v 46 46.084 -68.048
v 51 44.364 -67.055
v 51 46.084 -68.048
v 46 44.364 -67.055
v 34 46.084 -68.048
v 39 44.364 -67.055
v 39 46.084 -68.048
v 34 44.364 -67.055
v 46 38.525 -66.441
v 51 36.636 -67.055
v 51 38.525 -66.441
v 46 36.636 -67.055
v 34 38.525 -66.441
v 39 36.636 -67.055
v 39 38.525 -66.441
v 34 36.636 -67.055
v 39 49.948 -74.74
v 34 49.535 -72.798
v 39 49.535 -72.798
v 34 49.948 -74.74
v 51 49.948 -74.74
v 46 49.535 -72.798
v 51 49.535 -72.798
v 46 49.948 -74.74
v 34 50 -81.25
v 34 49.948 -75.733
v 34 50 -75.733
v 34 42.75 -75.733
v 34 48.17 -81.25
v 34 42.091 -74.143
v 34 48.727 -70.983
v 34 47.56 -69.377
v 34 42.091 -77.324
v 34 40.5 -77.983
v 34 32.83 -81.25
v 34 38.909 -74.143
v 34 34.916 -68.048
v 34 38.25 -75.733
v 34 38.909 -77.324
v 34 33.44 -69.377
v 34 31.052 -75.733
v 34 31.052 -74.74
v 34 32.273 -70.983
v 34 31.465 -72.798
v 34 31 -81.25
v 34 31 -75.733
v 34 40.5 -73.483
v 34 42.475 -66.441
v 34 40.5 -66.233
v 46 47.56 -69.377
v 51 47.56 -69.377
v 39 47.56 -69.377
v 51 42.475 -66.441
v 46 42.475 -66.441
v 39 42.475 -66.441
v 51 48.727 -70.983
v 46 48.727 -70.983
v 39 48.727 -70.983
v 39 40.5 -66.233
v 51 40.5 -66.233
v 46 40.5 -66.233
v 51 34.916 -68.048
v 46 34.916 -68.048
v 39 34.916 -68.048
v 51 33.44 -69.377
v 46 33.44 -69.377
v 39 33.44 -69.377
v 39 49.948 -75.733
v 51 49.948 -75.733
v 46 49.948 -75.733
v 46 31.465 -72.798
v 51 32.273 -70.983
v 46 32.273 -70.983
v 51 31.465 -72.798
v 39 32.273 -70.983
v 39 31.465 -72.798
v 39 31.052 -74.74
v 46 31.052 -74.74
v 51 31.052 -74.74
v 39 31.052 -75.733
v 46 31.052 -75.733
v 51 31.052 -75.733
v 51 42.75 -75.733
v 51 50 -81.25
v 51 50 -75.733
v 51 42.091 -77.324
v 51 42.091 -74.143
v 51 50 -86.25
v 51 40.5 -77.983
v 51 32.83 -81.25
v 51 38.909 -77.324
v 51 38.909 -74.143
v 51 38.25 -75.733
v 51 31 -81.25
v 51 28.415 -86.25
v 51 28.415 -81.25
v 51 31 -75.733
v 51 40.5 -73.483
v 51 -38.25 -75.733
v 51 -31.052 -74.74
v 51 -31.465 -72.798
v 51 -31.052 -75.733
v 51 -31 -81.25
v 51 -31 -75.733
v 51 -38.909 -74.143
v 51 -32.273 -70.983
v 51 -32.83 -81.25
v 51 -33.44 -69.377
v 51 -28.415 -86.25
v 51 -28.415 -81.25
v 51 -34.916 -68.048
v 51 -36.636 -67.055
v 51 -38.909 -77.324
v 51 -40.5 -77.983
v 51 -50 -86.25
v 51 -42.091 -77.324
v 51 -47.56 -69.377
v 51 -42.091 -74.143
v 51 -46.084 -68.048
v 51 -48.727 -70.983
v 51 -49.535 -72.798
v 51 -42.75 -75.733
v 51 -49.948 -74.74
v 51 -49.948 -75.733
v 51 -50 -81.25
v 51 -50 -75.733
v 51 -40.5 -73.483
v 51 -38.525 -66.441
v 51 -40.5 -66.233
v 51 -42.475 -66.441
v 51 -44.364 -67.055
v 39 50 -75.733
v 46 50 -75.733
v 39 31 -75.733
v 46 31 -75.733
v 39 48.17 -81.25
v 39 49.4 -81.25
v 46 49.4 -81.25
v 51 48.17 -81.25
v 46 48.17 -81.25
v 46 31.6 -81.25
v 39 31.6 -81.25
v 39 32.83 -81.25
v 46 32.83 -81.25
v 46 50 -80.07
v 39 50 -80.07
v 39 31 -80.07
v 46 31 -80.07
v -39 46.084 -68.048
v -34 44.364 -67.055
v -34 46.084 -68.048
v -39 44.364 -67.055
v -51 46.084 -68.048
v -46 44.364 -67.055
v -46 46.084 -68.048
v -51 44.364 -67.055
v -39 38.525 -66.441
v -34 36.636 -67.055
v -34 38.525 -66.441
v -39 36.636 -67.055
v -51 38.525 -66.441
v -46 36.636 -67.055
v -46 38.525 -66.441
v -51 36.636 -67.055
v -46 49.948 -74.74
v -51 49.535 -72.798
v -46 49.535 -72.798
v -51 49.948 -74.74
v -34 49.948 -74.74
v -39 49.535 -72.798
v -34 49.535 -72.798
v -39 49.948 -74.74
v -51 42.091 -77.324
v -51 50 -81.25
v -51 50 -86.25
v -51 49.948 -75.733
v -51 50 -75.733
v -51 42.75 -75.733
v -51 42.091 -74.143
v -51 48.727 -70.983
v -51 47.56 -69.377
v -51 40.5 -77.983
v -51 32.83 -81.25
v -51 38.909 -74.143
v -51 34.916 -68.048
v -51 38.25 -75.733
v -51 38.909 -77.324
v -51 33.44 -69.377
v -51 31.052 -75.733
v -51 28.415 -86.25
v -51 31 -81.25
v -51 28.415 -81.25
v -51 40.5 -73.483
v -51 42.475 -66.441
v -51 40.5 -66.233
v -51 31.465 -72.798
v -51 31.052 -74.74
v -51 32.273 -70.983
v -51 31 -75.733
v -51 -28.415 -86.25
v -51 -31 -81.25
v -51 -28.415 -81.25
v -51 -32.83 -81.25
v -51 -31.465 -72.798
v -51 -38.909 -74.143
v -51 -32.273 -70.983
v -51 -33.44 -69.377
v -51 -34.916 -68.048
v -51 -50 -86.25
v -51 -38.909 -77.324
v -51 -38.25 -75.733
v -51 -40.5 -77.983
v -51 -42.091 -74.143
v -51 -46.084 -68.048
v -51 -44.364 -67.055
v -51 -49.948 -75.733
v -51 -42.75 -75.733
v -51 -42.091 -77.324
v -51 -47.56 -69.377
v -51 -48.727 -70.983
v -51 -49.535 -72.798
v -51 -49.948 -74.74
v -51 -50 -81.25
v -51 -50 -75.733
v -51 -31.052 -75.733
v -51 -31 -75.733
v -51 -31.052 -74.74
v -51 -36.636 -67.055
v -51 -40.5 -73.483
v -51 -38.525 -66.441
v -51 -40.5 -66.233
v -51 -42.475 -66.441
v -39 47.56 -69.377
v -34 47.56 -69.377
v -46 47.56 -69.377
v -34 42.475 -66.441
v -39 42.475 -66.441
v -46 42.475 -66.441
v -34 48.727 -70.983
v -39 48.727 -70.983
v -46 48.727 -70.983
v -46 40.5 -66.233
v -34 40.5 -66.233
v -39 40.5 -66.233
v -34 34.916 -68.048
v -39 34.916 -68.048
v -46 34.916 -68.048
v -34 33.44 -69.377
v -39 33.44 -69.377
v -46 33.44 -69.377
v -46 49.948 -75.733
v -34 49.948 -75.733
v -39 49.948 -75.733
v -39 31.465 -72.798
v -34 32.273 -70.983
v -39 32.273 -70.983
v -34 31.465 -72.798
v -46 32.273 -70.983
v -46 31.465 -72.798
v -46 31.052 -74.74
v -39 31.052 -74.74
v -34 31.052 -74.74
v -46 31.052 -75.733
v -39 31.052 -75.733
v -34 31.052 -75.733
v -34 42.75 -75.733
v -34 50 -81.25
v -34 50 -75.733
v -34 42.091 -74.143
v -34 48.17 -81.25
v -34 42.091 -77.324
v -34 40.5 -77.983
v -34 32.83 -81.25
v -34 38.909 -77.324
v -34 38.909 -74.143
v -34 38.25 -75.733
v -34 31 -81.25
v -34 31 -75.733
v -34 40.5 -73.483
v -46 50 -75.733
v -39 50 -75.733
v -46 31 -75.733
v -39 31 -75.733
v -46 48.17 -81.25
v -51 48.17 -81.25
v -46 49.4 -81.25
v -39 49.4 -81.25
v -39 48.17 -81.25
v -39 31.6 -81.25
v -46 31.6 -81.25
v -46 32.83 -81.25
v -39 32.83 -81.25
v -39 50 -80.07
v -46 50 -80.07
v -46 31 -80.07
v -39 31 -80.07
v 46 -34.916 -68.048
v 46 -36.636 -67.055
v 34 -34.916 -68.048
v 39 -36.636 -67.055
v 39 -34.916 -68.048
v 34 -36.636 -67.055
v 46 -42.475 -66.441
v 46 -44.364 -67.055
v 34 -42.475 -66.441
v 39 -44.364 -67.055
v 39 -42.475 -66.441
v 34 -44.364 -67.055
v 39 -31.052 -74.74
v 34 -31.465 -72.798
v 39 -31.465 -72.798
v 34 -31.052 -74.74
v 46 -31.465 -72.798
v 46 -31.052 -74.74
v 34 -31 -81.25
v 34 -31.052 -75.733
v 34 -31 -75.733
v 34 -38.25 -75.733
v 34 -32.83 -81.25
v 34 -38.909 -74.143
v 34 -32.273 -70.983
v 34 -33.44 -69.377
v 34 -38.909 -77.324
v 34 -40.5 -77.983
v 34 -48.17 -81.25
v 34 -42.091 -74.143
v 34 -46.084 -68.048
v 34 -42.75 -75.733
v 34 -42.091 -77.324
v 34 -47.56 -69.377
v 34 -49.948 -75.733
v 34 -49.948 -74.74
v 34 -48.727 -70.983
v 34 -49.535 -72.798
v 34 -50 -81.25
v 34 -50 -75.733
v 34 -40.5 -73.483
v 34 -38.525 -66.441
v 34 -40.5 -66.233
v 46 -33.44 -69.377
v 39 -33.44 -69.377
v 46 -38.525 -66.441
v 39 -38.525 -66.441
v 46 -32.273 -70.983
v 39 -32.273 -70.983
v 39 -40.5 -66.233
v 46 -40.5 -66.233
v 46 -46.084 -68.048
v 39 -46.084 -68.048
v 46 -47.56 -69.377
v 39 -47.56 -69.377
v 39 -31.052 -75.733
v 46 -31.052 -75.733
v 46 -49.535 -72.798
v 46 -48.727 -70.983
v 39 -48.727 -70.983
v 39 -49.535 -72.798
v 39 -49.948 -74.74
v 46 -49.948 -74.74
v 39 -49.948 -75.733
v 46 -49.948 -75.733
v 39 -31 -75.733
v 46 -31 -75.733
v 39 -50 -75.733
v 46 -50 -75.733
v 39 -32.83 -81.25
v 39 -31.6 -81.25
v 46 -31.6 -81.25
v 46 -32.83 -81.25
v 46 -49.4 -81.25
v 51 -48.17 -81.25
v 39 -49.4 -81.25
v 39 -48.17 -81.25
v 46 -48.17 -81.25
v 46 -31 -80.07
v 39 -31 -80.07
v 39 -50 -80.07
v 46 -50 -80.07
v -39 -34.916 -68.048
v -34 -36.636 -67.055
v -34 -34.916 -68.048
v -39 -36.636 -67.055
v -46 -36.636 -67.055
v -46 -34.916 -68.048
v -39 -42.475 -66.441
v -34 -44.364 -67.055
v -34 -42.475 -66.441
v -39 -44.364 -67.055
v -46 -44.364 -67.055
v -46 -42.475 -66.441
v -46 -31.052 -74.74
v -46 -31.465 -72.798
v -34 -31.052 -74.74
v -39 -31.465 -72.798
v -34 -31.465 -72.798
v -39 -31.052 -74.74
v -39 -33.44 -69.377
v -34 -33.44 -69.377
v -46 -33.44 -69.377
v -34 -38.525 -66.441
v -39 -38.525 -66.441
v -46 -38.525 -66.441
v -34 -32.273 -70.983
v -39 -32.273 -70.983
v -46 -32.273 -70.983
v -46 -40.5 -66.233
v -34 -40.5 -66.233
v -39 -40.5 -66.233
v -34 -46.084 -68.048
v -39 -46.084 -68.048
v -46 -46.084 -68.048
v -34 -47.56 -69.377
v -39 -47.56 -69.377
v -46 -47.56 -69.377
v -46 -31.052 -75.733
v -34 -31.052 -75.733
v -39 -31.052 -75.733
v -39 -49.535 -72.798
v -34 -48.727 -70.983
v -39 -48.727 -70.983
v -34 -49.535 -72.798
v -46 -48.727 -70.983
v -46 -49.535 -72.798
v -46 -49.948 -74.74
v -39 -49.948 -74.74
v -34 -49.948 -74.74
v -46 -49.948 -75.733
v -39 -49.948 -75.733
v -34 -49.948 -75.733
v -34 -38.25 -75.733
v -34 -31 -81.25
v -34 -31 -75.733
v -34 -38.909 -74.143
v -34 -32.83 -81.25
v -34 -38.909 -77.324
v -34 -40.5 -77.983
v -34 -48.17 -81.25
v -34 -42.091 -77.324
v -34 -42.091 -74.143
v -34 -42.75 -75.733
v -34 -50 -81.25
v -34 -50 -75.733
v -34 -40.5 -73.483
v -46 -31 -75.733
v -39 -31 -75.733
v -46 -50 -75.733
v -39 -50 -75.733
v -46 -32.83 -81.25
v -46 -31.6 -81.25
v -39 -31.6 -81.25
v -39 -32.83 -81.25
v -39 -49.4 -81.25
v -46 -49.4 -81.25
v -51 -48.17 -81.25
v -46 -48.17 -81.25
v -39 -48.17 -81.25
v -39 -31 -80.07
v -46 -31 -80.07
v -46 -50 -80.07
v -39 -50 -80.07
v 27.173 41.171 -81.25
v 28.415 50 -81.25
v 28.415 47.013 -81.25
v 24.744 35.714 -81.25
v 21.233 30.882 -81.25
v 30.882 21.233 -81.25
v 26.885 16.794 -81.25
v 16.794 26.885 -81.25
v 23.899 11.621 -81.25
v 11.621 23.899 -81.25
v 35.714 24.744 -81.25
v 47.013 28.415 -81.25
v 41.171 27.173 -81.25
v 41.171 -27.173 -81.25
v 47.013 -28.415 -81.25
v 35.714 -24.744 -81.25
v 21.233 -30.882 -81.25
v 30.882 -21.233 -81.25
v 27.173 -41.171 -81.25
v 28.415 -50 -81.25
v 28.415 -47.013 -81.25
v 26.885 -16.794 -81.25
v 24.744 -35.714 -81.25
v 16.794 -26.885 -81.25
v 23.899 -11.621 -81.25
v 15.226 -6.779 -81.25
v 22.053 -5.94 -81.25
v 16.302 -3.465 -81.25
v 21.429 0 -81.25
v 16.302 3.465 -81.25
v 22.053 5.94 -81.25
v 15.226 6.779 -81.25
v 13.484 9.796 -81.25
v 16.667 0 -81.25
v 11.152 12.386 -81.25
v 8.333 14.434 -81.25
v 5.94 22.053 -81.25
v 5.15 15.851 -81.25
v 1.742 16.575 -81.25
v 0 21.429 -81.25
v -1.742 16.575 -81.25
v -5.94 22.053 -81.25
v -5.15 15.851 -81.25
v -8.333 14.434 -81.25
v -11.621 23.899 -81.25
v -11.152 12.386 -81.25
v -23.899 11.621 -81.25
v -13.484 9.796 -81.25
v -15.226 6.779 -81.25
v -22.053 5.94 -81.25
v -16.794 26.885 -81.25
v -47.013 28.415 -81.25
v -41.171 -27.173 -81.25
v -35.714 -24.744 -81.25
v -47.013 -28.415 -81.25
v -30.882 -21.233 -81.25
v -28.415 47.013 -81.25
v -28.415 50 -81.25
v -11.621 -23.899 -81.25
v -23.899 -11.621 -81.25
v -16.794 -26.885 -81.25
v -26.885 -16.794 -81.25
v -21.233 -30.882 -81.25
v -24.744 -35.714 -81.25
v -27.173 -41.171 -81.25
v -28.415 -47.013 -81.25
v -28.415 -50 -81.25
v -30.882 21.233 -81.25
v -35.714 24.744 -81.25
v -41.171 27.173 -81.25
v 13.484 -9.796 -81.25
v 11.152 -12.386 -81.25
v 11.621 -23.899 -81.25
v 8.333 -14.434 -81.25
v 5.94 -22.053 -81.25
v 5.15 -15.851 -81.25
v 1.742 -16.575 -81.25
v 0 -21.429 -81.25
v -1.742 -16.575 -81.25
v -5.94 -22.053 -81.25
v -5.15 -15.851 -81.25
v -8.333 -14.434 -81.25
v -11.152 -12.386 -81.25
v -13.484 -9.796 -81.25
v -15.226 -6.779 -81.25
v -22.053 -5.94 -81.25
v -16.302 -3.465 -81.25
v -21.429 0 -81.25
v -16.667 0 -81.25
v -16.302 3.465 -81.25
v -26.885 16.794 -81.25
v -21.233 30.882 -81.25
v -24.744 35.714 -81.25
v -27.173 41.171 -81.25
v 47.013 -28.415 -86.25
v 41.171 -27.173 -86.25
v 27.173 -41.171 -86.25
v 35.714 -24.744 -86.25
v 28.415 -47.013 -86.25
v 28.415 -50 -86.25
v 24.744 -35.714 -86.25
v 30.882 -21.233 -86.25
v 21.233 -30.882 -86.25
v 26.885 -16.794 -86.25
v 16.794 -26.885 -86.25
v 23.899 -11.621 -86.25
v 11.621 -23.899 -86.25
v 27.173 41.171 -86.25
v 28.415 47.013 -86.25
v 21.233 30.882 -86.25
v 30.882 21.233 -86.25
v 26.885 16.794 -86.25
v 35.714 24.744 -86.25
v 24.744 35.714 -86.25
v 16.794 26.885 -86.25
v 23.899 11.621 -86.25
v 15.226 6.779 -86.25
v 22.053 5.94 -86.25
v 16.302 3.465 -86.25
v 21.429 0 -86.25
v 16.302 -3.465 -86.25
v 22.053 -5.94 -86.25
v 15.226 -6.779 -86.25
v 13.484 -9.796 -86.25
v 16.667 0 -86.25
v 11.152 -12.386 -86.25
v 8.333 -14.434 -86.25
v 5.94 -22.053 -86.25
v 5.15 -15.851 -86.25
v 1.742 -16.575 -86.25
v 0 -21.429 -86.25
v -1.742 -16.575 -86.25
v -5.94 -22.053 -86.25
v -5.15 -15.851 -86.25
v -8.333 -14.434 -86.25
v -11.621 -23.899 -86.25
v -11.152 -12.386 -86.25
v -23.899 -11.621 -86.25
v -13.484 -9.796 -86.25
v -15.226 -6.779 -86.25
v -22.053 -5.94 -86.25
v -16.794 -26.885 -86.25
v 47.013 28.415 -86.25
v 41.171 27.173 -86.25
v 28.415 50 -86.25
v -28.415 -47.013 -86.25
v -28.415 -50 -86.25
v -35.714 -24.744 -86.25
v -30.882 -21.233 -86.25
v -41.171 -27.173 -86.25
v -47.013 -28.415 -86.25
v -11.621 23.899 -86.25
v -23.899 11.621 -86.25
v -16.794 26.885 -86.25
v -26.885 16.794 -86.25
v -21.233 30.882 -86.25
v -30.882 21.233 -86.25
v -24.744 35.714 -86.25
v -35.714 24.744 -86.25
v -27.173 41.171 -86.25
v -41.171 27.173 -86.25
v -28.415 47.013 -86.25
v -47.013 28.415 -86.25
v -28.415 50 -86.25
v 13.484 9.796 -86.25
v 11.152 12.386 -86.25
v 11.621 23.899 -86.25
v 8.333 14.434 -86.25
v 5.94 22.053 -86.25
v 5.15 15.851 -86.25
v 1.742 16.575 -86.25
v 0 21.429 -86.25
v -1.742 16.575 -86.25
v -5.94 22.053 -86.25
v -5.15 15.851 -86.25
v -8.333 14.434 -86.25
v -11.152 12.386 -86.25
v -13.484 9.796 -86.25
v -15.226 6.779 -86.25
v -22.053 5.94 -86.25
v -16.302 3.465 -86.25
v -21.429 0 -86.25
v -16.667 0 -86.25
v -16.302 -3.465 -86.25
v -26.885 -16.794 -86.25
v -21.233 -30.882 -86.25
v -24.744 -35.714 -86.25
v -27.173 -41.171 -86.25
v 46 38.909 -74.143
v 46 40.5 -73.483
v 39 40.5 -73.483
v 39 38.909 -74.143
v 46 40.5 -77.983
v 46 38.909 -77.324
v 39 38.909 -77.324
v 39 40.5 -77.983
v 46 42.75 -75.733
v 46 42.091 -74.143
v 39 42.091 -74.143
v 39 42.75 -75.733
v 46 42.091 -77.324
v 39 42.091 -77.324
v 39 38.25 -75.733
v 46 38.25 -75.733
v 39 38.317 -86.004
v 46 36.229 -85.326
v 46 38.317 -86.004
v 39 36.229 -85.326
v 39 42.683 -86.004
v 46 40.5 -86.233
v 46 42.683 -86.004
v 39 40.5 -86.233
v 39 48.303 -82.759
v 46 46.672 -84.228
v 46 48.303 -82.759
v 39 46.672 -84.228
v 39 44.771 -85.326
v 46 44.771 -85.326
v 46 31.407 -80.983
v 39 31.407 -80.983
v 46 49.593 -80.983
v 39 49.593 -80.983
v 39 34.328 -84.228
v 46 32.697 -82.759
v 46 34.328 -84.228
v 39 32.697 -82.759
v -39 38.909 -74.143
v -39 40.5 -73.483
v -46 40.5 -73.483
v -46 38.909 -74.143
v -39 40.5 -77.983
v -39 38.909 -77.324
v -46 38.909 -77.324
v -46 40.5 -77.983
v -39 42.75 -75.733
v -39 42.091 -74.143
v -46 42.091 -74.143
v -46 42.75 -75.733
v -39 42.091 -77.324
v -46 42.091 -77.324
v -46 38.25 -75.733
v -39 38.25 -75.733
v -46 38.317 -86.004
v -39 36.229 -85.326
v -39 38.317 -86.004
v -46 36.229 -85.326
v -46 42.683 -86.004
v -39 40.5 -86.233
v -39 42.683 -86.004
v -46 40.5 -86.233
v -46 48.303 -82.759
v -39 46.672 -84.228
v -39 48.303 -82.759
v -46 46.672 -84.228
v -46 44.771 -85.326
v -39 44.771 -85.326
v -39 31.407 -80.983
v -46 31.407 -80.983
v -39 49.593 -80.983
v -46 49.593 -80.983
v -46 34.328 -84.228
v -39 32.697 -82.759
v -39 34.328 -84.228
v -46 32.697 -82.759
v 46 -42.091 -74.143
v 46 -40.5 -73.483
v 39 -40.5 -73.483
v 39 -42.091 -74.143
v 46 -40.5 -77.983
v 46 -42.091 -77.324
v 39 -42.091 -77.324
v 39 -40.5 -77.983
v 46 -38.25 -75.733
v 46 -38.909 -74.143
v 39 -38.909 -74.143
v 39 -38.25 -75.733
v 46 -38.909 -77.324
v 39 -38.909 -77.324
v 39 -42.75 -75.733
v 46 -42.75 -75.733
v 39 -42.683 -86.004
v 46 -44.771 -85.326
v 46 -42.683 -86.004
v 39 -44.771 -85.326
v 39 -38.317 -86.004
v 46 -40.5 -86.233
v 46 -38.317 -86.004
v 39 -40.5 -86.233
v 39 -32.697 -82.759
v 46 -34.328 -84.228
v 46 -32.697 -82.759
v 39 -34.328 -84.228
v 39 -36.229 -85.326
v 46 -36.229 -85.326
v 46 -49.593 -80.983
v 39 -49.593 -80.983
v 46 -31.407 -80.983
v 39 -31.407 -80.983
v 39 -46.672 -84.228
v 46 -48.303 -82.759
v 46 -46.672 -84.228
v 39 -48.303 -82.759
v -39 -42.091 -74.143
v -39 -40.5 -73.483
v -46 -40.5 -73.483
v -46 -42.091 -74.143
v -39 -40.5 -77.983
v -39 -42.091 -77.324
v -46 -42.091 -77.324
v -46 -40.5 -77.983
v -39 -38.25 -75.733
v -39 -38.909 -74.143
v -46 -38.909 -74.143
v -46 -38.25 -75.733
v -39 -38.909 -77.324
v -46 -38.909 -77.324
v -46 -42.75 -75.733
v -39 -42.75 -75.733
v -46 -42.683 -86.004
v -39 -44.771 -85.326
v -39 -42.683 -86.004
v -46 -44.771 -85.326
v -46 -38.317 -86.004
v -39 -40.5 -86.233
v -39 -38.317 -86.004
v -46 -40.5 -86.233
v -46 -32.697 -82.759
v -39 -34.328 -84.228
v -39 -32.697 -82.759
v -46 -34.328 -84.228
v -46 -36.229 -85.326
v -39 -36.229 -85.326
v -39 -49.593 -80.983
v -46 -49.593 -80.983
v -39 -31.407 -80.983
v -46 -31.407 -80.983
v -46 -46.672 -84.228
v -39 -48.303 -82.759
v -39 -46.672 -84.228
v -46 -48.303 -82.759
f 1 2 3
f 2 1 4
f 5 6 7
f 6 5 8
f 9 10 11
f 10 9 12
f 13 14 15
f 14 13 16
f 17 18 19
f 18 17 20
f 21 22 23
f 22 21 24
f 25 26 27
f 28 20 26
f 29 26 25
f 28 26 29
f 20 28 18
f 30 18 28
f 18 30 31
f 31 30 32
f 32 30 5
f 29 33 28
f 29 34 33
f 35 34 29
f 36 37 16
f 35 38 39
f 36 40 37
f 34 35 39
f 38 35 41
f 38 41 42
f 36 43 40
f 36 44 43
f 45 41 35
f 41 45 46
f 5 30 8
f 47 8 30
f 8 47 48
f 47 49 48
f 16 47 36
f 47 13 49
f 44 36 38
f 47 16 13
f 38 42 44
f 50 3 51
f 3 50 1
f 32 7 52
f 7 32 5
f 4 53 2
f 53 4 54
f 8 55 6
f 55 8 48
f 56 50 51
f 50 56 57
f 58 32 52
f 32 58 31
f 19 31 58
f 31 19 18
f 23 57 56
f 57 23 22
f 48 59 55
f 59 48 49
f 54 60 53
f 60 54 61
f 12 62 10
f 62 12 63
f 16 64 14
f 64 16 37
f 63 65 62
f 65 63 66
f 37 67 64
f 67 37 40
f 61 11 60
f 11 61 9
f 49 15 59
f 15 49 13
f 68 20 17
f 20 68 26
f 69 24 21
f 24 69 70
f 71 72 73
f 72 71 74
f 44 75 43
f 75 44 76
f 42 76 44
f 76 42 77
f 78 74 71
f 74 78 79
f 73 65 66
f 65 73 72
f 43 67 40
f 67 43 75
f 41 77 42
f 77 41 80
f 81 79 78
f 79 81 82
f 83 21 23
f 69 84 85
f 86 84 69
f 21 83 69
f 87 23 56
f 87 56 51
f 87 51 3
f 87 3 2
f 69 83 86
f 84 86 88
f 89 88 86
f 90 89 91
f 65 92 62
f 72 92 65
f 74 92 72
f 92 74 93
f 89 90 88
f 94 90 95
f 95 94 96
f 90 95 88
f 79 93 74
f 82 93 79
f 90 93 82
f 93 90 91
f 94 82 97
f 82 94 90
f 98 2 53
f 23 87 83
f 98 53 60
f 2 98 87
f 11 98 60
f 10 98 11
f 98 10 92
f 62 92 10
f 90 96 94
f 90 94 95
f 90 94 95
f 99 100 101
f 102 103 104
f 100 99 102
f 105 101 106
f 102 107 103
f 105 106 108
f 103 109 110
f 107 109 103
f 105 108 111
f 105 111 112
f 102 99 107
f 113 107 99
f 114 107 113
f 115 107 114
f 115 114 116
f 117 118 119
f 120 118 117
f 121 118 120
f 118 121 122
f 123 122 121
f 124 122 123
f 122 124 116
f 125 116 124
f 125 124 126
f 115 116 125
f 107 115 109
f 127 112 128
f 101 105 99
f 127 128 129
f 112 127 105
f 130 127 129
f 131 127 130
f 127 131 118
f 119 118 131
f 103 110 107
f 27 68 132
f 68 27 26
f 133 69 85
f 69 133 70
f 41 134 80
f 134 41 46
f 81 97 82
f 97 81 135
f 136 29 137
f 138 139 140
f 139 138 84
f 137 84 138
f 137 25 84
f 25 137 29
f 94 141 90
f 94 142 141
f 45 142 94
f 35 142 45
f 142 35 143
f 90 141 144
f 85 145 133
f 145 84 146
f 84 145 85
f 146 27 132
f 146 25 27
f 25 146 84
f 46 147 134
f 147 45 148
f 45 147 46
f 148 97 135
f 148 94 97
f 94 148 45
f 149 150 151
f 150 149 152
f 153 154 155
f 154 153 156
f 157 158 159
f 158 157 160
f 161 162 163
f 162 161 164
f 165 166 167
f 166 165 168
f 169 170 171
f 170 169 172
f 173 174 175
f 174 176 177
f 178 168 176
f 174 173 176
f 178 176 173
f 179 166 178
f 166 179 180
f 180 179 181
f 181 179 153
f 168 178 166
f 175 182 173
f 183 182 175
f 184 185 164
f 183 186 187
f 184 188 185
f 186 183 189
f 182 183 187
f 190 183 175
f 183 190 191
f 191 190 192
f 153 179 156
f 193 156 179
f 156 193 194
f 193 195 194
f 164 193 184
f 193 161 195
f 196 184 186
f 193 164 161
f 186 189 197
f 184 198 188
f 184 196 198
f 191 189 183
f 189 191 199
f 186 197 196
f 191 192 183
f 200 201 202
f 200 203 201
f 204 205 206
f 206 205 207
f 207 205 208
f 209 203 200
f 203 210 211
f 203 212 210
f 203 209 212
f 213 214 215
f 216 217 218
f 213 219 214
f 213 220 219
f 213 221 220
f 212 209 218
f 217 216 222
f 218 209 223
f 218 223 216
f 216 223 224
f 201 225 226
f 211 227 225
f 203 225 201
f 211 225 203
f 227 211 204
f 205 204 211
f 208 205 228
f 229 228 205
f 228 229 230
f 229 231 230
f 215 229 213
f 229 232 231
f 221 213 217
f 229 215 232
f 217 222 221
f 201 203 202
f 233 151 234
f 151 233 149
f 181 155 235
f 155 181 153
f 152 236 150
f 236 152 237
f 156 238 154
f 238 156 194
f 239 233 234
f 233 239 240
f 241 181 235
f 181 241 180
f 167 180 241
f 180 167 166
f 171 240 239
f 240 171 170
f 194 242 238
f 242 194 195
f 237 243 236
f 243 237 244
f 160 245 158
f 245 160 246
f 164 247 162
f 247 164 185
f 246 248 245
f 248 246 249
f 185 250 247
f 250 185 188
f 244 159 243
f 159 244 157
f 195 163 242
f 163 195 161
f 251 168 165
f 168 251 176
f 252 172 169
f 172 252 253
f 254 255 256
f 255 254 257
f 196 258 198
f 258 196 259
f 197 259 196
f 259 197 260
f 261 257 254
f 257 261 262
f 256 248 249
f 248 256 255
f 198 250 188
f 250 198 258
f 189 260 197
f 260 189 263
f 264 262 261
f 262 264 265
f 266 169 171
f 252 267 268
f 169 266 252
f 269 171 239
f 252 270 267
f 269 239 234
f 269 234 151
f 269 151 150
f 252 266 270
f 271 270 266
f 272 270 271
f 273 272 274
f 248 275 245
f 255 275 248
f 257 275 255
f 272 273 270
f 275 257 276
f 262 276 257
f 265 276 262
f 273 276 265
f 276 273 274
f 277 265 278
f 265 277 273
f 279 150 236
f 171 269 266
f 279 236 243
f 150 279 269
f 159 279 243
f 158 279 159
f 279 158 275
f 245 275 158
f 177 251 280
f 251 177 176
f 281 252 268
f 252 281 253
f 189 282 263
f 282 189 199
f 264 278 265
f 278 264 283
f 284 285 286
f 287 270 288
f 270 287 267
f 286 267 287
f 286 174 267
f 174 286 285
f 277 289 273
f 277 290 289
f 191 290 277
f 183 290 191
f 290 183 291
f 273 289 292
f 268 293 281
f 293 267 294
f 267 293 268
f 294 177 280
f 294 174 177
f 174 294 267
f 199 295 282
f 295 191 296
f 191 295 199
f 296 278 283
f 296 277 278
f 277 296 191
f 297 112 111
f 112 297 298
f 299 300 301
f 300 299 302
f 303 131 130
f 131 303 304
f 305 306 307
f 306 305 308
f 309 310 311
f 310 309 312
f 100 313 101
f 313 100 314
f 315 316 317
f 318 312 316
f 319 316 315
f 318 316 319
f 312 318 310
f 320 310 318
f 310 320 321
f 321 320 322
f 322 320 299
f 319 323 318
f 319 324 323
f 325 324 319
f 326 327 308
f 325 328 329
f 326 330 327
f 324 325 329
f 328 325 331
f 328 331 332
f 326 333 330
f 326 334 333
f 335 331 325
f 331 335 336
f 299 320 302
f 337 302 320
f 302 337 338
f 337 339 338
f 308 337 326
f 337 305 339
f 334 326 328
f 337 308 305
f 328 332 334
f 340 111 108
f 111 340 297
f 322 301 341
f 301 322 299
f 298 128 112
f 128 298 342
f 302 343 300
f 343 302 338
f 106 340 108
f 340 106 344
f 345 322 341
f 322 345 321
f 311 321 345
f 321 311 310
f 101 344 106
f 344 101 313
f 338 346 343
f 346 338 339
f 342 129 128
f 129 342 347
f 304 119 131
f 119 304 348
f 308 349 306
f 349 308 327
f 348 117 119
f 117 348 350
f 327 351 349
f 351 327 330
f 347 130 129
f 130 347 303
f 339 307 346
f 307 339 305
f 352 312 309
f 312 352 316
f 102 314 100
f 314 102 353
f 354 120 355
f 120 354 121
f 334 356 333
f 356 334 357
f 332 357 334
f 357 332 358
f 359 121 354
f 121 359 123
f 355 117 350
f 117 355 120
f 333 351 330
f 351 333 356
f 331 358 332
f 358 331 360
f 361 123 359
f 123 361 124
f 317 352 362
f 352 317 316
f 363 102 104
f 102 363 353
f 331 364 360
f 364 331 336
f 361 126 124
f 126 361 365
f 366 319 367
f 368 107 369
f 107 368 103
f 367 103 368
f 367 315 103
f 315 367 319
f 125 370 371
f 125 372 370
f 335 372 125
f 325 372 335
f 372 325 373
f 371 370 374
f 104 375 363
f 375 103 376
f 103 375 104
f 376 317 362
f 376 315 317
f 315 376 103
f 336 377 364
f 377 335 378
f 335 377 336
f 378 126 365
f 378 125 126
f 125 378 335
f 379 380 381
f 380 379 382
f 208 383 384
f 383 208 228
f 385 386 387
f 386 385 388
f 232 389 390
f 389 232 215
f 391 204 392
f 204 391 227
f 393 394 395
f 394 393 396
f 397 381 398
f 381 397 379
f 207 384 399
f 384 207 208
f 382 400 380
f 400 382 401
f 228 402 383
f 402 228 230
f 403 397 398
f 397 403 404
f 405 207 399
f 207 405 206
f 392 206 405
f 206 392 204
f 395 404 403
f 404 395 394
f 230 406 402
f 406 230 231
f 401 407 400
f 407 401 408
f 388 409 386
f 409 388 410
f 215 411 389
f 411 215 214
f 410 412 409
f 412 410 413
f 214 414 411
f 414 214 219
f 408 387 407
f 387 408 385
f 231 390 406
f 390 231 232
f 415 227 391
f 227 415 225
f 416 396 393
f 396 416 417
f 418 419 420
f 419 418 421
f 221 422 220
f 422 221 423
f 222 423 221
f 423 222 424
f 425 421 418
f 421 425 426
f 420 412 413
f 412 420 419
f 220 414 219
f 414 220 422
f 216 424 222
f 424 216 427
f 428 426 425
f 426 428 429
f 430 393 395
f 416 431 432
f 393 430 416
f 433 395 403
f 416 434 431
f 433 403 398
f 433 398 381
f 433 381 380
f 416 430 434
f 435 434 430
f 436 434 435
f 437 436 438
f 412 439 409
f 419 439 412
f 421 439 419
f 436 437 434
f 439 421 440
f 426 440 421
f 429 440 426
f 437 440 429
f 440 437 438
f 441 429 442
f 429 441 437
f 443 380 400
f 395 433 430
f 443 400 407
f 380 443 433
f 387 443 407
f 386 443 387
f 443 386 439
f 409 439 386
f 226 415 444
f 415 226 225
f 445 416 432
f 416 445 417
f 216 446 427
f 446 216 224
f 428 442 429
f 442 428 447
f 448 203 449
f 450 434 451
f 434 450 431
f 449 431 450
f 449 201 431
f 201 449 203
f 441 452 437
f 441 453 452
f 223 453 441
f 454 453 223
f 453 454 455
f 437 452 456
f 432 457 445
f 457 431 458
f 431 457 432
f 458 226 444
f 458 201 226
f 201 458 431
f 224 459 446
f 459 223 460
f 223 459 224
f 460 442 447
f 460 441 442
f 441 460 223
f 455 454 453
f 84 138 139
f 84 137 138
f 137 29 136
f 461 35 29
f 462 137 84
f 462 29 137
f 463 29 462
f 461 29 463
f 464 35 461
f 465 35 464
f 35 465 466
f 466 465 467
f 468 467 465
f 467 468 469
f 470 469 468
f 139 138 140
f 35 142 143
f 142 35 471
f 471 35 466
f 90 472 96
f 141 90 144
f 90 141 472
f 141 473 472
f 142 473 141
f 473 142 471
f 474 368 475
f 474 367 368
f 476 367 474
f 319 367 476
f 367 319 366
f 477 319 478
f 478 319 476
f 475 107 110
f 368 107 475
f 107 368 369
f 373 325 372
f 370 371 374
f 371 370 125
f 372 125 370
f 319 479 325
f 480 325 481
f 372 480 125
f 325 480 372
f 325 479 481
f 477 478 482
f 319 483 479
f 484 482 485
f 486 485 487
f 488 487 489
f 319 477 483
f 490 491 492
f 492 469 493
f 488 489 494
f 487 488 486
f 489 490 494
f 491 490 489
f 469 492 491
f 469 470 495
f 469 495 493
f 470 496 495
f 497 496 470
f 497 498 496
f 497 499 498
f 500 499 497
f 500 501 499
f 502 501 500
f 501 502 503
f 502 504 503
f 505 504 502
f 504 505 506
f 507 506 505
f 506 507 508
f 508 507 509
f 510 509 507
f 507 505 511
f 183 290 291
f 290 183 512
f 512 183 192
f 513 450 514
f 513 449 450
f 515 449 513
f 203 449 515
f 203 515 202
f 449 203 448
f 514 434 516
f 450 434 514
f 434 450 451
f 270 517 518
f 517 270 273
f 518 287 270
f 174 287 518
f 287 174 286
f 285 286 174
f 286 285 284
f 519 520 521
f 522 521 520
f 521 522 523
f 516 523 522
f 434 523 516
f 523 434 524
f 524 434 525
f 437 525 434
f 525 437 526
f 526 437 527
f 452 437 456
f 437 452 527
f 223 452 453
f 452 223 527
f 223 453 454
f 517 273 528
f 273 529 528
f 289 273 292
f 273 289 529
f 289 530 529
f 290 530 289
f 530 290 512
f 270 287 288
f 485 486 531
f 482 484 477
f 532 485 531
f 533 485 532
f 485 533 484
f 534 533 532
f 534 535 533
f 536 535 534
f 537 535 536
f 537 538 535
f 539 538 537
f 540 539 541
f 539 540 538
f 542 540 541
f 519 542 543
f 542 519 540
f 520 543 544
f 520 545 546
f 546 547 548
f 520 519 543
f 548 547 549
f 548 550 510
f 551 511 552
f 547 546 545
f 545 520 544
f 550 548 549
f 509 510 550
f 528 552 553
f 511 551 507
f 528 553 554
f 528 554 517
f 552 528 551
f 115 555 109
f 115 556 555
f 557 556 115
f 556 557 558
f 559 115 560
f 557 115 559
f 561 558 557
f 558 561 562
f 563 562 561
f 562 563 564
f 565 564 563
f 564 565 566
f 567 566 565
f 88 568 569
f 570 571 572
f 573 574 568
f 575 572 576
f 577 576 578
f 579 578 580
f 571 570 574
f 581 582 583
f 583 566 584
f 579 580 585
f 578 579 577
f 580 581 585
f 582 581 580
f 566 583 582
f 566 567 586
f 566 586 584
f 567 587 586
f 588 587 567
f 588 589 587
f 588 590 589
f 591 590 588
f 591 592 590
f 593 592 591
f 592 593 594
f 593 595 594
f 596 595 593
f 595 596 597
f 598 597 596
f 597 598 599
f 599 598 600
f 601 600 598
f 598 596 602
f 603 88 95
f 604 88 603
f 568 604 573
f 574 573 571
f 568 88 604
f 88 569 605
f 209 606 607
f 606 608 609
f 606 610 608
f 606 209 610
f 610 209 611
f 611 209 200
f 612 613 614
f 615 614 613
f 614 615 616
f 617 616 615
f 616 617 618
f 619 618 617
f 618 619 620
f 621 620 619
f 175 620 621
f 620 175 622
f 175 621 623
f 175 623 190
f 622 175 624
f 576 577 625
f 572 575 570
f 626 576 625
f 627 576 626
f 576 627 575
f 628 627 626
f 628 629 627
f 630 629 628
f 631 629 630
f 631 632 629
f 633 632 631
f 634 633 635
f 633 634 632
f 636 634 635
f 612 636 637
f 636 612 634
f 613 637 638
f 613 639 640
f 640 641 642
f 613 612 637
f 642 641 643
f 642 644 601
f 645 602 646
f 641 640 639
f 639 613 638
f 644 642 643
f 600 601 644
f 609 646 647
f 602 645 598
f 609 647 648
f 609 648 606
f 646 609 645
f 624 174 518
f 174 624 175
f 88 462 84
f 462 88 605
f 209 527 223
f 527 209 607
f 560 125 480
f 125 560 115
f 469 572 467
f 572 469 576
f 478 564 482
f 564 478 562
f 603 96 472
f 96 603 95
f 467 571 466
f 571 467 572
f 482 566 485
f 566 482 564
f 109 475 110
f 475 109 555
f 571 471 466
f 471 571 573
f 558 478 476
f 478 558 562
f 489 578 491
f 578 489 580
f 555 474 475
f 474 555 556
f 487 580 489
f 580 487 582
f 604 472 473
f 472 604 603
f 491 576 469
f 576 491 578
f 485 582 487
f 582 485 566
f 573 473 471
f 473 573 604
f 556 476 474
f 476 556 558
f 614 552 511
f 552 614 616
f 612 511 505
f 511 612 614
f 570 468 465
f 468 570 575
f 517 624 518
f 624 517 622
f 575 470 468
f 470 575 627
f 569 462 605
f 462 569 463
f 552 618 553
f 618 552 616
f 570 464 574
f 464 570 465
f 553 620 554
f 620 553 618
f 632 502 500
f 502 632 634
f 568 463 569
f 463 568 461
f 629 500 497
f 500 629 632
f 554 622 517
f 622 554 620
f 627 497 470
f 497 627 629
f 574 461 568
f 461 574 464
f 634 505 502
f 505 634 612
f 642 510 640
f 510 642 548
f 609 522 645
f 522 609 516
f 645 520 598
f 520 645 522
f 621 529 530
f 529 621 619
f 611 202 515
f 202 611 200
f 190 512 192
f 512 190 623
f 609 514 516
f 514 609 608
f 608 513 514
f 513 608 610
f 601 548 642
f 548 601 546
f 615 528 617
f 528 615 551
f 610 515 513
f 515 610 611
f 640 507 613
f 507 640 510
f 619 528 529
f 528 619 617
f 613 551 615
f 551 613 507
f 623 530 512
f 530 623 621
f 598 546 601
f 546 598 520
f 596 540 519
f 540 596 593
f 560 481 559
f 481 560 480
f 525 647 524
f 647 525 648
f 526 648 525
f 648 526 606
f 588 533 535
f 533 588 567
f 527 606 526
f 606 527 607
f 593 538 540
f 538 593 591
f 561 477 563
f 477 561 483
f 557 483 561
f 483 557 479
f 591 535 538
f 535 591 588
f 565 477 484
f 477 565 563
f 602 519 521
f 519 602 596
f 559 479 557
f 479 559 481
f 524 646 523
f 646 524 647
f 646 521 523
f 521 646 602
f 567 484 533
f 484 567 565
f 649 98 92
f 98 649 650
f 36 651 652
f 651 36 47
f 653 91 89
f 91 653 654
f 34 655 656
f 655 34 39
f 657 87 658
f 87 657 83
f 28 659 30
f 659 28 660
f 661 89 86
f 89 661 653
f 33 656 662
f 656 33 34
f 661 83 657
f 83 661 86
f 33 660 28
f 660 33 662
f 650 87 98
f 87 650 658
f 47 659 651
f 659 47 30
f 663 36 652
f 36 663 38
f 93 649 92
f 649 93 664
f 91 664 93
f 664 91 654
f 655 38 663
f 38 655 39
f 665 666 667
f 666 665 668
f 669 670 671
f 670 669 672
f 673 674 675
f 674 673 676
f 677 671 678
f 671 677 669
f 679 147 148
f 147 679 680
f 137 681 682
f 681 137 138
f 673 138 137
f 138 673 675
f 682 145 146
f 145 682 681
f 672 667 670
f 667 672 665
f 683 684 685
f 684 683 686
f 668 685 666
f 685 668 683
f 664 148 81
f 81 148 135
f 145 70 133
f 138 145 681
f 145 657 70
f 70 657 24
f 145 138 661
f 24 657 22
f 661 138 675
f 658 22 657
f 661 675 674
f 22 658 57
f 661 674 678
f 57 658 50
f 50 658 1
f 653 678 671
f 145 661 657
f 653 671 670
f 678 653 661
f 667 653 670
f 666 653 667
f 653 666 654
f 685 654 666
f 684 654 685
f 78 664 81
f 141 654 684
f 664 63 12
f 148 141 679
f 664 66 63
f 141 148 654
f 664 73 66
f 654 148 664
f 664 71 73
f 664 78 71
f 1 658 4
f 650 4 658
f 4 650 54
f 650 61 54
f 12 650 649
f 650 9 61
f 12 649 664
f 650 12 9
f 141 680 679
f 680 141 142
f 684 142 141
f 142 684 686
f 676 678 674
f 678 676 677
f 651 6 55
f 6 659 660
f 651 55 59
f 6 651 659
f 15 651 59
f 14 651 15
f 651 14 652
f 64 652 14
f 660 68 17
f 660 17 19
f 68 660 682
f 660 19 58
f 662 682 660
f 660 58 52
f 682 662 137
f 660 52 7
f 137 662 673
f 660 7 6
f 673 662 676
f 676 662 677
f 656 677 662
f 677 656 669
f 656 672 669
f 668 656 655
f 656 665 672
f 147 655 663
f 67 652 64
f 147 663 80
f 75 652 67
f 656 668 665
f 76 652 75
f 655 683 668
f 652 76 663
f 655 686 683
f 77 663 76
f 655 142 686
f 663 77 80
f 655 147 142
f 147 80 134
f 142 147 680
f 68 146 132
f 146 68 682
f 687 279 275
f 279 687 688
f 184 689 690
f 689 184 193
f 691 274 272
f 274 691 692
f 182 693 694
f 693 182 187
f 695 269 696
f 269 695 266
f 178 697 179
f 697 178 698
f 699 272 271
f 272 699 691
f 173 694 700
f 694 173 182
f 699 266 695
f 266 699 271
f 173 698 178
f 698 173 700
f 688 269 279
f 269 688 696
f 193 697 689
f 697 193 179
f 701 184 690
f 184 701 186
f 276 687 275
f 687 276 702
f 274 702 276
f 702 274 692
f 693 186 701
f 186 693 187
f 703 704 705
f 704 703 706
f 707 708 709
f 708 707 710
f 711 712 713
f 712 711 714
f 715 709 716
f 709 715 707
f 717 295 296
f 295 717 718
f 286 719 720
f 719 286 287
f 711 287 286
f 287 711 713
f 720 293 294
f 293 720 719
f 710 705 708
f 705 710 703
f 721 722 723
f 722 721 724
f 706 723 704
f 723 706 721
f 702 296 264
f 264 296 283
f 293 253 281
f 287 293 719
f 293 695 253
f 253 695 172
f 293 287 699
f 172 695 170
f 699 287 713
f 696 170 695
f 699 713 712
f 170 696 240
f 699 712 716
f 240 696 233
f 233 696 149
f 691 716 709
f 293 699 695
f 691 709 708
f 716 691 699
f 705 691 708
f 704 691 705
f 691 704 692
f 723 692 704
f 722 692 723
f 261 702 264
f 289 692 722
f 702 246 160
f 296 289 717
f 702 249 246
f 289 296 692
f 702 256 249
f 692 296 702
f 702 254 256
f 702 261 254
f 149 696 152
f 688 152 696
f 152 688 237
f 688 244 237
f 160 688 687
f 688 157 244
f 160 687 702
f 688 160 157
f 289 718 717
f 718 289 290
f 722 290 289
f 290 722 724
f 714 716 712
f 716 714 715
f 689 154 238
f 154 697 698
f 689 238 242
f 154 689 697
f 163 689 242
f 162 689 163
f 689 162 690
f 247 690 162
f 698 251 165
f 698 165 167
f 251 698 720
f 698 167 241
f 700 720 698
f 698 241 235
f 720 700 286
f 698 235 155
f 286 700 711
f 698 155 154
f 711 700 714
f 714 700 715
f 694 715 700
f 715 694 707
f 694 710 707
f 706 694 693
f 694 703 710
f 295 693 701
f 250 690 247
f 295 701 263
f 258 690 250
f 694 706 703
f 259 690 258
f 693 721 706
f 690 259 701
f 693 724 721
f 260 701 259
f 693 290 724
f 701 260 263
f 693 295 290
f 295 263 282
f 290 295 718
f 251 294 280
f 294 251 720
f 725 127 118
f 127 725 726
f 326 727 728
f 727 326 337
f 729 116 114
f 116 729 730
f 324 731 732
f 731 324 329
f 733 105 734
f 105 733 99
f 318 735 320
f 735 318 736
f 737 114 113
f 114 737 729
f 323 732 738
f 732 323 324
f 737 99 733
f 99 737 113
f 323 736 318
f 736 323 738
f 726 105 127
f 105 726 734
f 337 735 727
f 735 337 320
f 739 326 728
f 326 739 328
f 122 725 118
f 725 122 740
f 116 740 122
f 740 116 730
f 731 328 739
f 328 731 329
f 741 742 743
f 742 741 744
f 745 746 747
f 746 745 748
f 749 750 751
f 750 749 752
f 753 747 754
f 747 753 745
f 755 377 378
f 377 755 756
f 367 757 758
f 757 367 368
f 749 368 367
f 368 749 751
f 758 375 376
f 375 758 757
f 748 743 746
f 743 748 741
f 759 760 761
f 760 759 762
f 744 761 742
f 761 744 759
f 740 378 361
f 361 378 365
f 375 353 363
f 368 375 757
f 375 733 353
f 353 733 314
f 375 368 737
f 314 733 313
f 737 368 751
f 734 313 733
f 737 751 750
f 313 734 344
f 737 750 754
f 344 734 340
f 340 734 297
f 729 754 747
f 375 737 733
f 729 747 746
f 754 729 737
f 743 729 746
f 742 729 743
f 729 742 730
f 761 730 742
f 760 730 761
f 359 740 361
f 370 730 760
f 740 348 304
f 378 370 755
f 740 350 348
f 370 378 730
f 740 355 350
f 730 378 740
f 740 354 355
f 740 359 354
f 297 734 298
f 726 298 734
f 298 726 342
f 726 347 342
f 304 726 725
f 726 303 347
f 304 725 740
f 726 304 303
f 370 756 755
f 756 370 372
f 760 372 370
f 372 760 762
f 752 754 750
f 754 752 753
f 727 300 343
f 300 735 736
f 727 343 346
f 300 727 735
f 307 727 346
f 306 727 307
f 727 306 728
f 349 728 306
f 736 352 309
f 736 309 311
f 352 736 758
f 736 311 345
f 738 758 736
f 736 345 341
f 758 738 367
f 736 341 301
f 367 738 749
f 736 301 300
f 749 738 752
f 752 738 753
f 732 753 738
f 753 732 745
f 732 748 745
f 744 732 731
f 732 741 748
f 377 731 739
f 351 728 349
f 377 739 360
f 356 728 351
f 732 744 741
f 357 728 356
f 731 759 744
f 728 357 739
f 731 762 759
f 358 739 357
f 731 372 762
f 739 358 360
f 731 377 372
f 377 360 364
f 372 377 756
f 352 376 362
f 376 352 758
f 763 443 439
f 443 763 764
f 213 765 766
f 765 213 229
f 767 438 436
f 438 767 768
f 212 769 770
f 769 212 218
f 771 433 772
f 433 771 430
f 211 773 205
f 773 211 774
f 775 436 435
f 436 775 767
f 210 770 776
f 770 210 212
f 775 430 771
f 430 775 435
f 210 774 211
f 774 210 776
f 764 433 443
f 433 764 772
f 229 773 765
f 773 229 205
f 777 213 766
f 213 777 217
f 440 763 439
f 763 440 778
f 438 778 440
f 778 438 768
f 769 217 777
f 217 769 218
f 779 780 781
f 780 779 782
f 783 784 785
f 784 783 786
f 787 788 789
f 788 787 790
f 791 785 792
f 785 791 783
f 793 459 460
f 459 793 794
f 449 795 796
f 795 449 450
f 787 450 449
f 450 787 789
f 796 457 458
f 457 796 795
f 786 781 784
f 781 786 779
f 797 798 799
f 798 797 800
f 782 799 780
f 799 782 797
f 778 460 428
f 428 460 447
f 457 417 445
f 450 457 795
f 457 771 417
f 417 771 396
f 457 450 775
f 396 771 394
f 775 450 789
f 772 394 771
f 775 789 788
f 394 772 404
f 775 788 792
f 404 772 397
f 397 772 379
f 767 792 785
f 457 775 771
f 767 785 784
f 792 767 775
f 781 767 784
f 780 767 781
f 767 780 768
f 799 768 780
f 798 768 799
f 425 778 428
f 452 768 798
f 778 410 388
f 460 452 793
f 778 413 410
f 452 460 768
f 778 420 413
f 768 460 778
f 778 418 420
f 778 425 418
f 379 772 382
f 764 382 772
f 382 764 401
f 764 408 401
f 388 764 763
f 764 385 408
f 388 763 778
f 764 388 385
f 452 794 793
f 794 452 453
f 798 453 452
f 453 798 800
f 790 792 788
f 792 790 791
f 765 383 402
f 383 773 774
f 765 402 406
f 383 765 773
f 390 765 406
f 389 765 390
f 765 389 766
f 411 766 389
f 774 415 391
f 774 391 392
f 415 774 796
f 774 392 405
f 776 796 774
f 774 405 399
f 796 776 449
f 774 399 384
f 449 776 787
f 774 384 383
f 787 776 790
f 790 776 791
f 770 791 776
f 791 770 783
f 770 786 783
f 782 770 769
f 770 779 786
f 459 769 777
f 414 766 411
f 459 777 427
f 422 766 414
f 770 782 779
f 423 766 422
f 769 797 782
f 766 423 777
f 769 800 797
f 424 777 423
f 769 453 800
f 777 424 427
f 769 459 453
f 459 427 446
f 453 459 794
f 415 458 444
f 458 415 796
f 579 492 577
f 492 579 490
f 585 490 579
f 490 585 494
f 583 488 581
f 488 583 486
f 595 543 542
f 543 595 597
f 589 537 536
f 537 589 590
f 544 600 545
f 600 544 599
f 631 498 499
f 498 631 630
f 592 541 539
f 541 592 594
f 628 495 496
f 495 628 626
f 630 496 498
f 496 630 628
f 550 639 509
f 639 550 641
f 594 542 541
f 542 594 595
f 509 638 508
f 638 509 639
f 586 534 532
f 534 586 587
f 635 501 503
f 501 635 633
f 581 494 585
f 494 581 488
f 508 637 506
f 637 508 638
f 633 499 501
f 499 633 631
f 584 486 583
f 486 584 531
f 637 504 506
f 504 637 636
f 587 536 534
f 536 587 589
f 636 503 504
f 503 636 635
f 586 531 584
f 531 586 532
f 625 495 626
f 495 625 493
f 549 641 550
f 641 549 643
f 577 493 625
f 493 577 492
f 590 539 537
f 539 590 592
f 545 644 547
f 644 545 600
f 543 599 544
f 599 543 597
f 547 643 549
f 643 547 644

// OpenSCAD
// [FL_INDEX: keywords="openscad, 3d_parametric, Printable_Spool_Roller, csg_solid" | COT="Parametric OpenSCAD design from 3DCodeverse"]
// Title: Printable Spool Roller

// ===== file: PrintableSpool_Holder.scad =====
//Created by Cid Vilas
//http://www.flickr.com/CidVilas/


//################################################################################
//##                                                                            ##
//##                PLEASE READ INSTRUCTIONS BEFORE MODIFYING                   ##
//##                                                                            ##
//################################################################################


//Specification of the Spool Dimensions:
//		spool_wall = The thickness of the walls of the spool
//		spool_width = The dimension of the spool from outer side to opposite outer side
//		spool_diameter = The diameter of the outer edges of the spool body, not the
//					filament outer diameter (The filament should not extend
//					past this dimension)
//		hole_diameter = The diameter of the hole inside the spool (Currently
//					unused.  Included for just to be thorough)

//Specification of the Hardware:
//		bearing_diameter = The outer diameter of the bearing.  (If you plan on adding
//						a fender washer or lip in the plastic, be sure to offset here)
//		bearing_thickness = The side to side dimension of the bearing.  (If you plan on
//						adding washers, be sure to add to the dimensions)
//		bolt_diameter = This is the diameter of the bolt to be used to secure the bearing
//					and washers to the spool holder.

//Specification of the Spool Holder
//		holder_base_length = In order to properly fit your spool, and maintain stability
//						of the spool holder, be sure this dimension is as wide as
//						possible.  If this value is too small, the spool holder
//						will compare to a football balanced on a Golf Tee.
//		holder_base_height = The thickness of the base of the stand.  Increase for
//						durability, but this will increase pastic usage.
//		holder_wall = This is the thickness of the plastic around the bearing capture.

//NOTE:  The remaining values are not for customization of the stand.  They are used for
//		design.  Adjust at your own risk!


spool_wall = 5;
spool_width = 90 - spool_wall;
spool_diameter = 162.5;
hole_diameter = 37.5;

bearing_diameter = 19;			//Bearing + Fender = 13 + 6 = 19
bearing_thickness = 7;			//Bearing + 2xWasher = 5 + (2) = 7
bolt_diameter = 4.5;



holder_wall = 5;
holder_base_height = 5;
holder_base_width = spool_width + holder_wall;
holder_base_length = 100;

holder_bearing_width = bearing_diameter;
bearing_radius = spool_diameter / 2 + bearing_diameter / 2;
bearing_degree = acos((holder_base_length / 2) / (bearing_radius));
holder_bearing_height = bearing_radius * sin(-bearing_degree)  + spool_diameter/2;


module spool()
{
	rotate([0, 90, 0])
	difference()
	{
	union()
	{
		color([0.1,0.1,0.1])
		translate([0, 0, spool_width / 2])
		cylinder(r = spool_diameter / 2, h = spool_wall, center = true, $fn = 64);
		color([0.1,0.1,0.1])
		translate([0, 0, -(spool_width / 2)])
		cylinder(r = spool_diameter / 2, h = spool_wall, center = true, $fn = 64);
		color([0.5, 0, 0.7])
		translate([0, 0, 0])
		cylinder(r = spool_diameter / 2 - spool_wall, h = spool_width - spool_wall, center = true);
	}
	union()
	{
		color([0.6, 0.6, 0.6])
		cylinder(r = hole_diameter / 2, h = spool_width + spool_wall + 0.1, center = true);
	}
	}
}

module holder()
{
	color([1, 0, 0])
	translate([0, 0, -spool_diameter / 2])
	difference()
	{
	union()
	{
		translate([0, 0, -holder_base_height / 2])	
		cube([spool_width + bearing_thickness + holder_wall * 2,
			holder_base_length,
			holder_base_height], center = true);
		
		translate([spool_width / 2,
				holder_base_length / 2 - bearing_diameter / 2,
				holder_bearing_height])
		union()
		{
			rotate([0, 90, 0])
			cylinder(r = bearing_diameter / 2, h = bearing_thickness + holder_wall * 2, center = true);
			
			translate([0, 0, -holder_bearing_height / 2])
			cube([bearing_thickness + holder_wall * 2, bearing_diameter, holder_bearing_height], center = true);
		}
		translate([-spool_width / 2,
				holder_base_length / 2 - bearing_diameter / 2,
				holder_bearing_height])
		union()
		{
			rotate([0, 90, 0])
			cylinder(r = bearing_diameter / 2, h = bearing_thickness + holder_wall * 2, center = true);
			
			translate([0, 0, -holder_bearing_height / 2])
			cube([bearing_thickness + holder_wall * 2, bearing_diameter, holder_bearing_height], center = true);
		}


		translate([spool_width / 2,
				-(holder_base_length / 2 - bearing_diameter / 2),
				holder_bearing_height])
		union()
		{
			rotate([0, 90, 0])
			cylinder(r = bearing_diameter / 2, h = bearing_thickness + holder_wall * 2, center = true);
			
			translate([0, 0, -holder_bearing_height / 2])
			cube([bearing_thickness + holder_wall * 2, bearing_diameter, holder_bearing_height], center = true);
		}
		translate([-spool_width / 2,
				-(holder_base_length / 2 - bearing_diameter / 2),
				holder_bearing_height])
		union()
		{
			rotate([0, 90, 0])
			cylinder(r = bearing_diameter / 2, h = bearing_thickness + holder_wall * 2, center = true);
			
			translate([0, 0, -holder_bearing_height / 2])
			cube([bearing_thickness + holder_wall * 2, bearing_diameter, holder_bearing_height], center = true);
		}

	}
	union()
	{
		translate([0, 0, -holder_base_height / 2])	
		cylinder(r = holder_base_length / 6, h = holder_base_height + 0.05, center = true);		
		for(i = [0 : 3])
		{
			rotate([0, 0, i * 90])
			translate([holder_base_length / 2, 0, -holder_base_height / 2])	
			cylinder(r = holder_base_length / 3.5, h = holder_base_height + 0.05, center = true);
		}
		translate([spool_width / 2,
				holder_base_length / 2 - bearing_diameter / 2,
				holder_bearing_height])
		union()
		{
			rotate([0, 90, 0])
			cylinder(r = bolt_diameter / 2, h = spool_wall + bearing_thickness * 2 + 0.1, center = true);

			rotate([0, 90, 0])
			cylinder(r = bearing_diameter / 2 + 1, h = bearing_thickness, center = true);
		}
		translate([-spool_width / 2,
				holder_base_length / 2 - bearing_diameter / 2,
				holder_bearing_height])
		union()
		{
			rotate([0, 90, 0])
			cylinder(r = bolt_diameter / 2, h = spool_wall + bearing_thickness * 2 + 0.1, center = true);

			rotate([0, 90, 0])
			cylinder(r = bearing_diameter / 2 + 1, h = bearing_thickness, center = true);
		}


		translate([spool_width / 2,
				-(holder_base_length / 2 - bearing_diameter / 2),
				holder_bearing_height])
		union()
		{
			rotate([0, 90, 0])
			cylinder(r = bolt_diameter / 2, h = spool_wall + bearing_thickness * 2 + 0.1, center = true);

			rotate([0, 90, 0])
			cylinder(r = bearing_diameter / 2 + 1, h = bearing_thickness, center = true);
		}
		translate([-spool_width / 2,
				-(holder_base_length / 2 - bearing_diameter / 2),
				holder_bearing_height])
		union()
		{
			rotate([0, 90, 0])
			cylinder(r = bolt_diameter / 2, h = spool_wall + bearing_thickness * 2 + 0.1, center = true);

			rotate([0, 90, 0])
			cylinder(r = bearing_diameter / 2 + 1, h = bearing_thickness, center = true);
		}

	}
	}
}

holder();
//spool();
